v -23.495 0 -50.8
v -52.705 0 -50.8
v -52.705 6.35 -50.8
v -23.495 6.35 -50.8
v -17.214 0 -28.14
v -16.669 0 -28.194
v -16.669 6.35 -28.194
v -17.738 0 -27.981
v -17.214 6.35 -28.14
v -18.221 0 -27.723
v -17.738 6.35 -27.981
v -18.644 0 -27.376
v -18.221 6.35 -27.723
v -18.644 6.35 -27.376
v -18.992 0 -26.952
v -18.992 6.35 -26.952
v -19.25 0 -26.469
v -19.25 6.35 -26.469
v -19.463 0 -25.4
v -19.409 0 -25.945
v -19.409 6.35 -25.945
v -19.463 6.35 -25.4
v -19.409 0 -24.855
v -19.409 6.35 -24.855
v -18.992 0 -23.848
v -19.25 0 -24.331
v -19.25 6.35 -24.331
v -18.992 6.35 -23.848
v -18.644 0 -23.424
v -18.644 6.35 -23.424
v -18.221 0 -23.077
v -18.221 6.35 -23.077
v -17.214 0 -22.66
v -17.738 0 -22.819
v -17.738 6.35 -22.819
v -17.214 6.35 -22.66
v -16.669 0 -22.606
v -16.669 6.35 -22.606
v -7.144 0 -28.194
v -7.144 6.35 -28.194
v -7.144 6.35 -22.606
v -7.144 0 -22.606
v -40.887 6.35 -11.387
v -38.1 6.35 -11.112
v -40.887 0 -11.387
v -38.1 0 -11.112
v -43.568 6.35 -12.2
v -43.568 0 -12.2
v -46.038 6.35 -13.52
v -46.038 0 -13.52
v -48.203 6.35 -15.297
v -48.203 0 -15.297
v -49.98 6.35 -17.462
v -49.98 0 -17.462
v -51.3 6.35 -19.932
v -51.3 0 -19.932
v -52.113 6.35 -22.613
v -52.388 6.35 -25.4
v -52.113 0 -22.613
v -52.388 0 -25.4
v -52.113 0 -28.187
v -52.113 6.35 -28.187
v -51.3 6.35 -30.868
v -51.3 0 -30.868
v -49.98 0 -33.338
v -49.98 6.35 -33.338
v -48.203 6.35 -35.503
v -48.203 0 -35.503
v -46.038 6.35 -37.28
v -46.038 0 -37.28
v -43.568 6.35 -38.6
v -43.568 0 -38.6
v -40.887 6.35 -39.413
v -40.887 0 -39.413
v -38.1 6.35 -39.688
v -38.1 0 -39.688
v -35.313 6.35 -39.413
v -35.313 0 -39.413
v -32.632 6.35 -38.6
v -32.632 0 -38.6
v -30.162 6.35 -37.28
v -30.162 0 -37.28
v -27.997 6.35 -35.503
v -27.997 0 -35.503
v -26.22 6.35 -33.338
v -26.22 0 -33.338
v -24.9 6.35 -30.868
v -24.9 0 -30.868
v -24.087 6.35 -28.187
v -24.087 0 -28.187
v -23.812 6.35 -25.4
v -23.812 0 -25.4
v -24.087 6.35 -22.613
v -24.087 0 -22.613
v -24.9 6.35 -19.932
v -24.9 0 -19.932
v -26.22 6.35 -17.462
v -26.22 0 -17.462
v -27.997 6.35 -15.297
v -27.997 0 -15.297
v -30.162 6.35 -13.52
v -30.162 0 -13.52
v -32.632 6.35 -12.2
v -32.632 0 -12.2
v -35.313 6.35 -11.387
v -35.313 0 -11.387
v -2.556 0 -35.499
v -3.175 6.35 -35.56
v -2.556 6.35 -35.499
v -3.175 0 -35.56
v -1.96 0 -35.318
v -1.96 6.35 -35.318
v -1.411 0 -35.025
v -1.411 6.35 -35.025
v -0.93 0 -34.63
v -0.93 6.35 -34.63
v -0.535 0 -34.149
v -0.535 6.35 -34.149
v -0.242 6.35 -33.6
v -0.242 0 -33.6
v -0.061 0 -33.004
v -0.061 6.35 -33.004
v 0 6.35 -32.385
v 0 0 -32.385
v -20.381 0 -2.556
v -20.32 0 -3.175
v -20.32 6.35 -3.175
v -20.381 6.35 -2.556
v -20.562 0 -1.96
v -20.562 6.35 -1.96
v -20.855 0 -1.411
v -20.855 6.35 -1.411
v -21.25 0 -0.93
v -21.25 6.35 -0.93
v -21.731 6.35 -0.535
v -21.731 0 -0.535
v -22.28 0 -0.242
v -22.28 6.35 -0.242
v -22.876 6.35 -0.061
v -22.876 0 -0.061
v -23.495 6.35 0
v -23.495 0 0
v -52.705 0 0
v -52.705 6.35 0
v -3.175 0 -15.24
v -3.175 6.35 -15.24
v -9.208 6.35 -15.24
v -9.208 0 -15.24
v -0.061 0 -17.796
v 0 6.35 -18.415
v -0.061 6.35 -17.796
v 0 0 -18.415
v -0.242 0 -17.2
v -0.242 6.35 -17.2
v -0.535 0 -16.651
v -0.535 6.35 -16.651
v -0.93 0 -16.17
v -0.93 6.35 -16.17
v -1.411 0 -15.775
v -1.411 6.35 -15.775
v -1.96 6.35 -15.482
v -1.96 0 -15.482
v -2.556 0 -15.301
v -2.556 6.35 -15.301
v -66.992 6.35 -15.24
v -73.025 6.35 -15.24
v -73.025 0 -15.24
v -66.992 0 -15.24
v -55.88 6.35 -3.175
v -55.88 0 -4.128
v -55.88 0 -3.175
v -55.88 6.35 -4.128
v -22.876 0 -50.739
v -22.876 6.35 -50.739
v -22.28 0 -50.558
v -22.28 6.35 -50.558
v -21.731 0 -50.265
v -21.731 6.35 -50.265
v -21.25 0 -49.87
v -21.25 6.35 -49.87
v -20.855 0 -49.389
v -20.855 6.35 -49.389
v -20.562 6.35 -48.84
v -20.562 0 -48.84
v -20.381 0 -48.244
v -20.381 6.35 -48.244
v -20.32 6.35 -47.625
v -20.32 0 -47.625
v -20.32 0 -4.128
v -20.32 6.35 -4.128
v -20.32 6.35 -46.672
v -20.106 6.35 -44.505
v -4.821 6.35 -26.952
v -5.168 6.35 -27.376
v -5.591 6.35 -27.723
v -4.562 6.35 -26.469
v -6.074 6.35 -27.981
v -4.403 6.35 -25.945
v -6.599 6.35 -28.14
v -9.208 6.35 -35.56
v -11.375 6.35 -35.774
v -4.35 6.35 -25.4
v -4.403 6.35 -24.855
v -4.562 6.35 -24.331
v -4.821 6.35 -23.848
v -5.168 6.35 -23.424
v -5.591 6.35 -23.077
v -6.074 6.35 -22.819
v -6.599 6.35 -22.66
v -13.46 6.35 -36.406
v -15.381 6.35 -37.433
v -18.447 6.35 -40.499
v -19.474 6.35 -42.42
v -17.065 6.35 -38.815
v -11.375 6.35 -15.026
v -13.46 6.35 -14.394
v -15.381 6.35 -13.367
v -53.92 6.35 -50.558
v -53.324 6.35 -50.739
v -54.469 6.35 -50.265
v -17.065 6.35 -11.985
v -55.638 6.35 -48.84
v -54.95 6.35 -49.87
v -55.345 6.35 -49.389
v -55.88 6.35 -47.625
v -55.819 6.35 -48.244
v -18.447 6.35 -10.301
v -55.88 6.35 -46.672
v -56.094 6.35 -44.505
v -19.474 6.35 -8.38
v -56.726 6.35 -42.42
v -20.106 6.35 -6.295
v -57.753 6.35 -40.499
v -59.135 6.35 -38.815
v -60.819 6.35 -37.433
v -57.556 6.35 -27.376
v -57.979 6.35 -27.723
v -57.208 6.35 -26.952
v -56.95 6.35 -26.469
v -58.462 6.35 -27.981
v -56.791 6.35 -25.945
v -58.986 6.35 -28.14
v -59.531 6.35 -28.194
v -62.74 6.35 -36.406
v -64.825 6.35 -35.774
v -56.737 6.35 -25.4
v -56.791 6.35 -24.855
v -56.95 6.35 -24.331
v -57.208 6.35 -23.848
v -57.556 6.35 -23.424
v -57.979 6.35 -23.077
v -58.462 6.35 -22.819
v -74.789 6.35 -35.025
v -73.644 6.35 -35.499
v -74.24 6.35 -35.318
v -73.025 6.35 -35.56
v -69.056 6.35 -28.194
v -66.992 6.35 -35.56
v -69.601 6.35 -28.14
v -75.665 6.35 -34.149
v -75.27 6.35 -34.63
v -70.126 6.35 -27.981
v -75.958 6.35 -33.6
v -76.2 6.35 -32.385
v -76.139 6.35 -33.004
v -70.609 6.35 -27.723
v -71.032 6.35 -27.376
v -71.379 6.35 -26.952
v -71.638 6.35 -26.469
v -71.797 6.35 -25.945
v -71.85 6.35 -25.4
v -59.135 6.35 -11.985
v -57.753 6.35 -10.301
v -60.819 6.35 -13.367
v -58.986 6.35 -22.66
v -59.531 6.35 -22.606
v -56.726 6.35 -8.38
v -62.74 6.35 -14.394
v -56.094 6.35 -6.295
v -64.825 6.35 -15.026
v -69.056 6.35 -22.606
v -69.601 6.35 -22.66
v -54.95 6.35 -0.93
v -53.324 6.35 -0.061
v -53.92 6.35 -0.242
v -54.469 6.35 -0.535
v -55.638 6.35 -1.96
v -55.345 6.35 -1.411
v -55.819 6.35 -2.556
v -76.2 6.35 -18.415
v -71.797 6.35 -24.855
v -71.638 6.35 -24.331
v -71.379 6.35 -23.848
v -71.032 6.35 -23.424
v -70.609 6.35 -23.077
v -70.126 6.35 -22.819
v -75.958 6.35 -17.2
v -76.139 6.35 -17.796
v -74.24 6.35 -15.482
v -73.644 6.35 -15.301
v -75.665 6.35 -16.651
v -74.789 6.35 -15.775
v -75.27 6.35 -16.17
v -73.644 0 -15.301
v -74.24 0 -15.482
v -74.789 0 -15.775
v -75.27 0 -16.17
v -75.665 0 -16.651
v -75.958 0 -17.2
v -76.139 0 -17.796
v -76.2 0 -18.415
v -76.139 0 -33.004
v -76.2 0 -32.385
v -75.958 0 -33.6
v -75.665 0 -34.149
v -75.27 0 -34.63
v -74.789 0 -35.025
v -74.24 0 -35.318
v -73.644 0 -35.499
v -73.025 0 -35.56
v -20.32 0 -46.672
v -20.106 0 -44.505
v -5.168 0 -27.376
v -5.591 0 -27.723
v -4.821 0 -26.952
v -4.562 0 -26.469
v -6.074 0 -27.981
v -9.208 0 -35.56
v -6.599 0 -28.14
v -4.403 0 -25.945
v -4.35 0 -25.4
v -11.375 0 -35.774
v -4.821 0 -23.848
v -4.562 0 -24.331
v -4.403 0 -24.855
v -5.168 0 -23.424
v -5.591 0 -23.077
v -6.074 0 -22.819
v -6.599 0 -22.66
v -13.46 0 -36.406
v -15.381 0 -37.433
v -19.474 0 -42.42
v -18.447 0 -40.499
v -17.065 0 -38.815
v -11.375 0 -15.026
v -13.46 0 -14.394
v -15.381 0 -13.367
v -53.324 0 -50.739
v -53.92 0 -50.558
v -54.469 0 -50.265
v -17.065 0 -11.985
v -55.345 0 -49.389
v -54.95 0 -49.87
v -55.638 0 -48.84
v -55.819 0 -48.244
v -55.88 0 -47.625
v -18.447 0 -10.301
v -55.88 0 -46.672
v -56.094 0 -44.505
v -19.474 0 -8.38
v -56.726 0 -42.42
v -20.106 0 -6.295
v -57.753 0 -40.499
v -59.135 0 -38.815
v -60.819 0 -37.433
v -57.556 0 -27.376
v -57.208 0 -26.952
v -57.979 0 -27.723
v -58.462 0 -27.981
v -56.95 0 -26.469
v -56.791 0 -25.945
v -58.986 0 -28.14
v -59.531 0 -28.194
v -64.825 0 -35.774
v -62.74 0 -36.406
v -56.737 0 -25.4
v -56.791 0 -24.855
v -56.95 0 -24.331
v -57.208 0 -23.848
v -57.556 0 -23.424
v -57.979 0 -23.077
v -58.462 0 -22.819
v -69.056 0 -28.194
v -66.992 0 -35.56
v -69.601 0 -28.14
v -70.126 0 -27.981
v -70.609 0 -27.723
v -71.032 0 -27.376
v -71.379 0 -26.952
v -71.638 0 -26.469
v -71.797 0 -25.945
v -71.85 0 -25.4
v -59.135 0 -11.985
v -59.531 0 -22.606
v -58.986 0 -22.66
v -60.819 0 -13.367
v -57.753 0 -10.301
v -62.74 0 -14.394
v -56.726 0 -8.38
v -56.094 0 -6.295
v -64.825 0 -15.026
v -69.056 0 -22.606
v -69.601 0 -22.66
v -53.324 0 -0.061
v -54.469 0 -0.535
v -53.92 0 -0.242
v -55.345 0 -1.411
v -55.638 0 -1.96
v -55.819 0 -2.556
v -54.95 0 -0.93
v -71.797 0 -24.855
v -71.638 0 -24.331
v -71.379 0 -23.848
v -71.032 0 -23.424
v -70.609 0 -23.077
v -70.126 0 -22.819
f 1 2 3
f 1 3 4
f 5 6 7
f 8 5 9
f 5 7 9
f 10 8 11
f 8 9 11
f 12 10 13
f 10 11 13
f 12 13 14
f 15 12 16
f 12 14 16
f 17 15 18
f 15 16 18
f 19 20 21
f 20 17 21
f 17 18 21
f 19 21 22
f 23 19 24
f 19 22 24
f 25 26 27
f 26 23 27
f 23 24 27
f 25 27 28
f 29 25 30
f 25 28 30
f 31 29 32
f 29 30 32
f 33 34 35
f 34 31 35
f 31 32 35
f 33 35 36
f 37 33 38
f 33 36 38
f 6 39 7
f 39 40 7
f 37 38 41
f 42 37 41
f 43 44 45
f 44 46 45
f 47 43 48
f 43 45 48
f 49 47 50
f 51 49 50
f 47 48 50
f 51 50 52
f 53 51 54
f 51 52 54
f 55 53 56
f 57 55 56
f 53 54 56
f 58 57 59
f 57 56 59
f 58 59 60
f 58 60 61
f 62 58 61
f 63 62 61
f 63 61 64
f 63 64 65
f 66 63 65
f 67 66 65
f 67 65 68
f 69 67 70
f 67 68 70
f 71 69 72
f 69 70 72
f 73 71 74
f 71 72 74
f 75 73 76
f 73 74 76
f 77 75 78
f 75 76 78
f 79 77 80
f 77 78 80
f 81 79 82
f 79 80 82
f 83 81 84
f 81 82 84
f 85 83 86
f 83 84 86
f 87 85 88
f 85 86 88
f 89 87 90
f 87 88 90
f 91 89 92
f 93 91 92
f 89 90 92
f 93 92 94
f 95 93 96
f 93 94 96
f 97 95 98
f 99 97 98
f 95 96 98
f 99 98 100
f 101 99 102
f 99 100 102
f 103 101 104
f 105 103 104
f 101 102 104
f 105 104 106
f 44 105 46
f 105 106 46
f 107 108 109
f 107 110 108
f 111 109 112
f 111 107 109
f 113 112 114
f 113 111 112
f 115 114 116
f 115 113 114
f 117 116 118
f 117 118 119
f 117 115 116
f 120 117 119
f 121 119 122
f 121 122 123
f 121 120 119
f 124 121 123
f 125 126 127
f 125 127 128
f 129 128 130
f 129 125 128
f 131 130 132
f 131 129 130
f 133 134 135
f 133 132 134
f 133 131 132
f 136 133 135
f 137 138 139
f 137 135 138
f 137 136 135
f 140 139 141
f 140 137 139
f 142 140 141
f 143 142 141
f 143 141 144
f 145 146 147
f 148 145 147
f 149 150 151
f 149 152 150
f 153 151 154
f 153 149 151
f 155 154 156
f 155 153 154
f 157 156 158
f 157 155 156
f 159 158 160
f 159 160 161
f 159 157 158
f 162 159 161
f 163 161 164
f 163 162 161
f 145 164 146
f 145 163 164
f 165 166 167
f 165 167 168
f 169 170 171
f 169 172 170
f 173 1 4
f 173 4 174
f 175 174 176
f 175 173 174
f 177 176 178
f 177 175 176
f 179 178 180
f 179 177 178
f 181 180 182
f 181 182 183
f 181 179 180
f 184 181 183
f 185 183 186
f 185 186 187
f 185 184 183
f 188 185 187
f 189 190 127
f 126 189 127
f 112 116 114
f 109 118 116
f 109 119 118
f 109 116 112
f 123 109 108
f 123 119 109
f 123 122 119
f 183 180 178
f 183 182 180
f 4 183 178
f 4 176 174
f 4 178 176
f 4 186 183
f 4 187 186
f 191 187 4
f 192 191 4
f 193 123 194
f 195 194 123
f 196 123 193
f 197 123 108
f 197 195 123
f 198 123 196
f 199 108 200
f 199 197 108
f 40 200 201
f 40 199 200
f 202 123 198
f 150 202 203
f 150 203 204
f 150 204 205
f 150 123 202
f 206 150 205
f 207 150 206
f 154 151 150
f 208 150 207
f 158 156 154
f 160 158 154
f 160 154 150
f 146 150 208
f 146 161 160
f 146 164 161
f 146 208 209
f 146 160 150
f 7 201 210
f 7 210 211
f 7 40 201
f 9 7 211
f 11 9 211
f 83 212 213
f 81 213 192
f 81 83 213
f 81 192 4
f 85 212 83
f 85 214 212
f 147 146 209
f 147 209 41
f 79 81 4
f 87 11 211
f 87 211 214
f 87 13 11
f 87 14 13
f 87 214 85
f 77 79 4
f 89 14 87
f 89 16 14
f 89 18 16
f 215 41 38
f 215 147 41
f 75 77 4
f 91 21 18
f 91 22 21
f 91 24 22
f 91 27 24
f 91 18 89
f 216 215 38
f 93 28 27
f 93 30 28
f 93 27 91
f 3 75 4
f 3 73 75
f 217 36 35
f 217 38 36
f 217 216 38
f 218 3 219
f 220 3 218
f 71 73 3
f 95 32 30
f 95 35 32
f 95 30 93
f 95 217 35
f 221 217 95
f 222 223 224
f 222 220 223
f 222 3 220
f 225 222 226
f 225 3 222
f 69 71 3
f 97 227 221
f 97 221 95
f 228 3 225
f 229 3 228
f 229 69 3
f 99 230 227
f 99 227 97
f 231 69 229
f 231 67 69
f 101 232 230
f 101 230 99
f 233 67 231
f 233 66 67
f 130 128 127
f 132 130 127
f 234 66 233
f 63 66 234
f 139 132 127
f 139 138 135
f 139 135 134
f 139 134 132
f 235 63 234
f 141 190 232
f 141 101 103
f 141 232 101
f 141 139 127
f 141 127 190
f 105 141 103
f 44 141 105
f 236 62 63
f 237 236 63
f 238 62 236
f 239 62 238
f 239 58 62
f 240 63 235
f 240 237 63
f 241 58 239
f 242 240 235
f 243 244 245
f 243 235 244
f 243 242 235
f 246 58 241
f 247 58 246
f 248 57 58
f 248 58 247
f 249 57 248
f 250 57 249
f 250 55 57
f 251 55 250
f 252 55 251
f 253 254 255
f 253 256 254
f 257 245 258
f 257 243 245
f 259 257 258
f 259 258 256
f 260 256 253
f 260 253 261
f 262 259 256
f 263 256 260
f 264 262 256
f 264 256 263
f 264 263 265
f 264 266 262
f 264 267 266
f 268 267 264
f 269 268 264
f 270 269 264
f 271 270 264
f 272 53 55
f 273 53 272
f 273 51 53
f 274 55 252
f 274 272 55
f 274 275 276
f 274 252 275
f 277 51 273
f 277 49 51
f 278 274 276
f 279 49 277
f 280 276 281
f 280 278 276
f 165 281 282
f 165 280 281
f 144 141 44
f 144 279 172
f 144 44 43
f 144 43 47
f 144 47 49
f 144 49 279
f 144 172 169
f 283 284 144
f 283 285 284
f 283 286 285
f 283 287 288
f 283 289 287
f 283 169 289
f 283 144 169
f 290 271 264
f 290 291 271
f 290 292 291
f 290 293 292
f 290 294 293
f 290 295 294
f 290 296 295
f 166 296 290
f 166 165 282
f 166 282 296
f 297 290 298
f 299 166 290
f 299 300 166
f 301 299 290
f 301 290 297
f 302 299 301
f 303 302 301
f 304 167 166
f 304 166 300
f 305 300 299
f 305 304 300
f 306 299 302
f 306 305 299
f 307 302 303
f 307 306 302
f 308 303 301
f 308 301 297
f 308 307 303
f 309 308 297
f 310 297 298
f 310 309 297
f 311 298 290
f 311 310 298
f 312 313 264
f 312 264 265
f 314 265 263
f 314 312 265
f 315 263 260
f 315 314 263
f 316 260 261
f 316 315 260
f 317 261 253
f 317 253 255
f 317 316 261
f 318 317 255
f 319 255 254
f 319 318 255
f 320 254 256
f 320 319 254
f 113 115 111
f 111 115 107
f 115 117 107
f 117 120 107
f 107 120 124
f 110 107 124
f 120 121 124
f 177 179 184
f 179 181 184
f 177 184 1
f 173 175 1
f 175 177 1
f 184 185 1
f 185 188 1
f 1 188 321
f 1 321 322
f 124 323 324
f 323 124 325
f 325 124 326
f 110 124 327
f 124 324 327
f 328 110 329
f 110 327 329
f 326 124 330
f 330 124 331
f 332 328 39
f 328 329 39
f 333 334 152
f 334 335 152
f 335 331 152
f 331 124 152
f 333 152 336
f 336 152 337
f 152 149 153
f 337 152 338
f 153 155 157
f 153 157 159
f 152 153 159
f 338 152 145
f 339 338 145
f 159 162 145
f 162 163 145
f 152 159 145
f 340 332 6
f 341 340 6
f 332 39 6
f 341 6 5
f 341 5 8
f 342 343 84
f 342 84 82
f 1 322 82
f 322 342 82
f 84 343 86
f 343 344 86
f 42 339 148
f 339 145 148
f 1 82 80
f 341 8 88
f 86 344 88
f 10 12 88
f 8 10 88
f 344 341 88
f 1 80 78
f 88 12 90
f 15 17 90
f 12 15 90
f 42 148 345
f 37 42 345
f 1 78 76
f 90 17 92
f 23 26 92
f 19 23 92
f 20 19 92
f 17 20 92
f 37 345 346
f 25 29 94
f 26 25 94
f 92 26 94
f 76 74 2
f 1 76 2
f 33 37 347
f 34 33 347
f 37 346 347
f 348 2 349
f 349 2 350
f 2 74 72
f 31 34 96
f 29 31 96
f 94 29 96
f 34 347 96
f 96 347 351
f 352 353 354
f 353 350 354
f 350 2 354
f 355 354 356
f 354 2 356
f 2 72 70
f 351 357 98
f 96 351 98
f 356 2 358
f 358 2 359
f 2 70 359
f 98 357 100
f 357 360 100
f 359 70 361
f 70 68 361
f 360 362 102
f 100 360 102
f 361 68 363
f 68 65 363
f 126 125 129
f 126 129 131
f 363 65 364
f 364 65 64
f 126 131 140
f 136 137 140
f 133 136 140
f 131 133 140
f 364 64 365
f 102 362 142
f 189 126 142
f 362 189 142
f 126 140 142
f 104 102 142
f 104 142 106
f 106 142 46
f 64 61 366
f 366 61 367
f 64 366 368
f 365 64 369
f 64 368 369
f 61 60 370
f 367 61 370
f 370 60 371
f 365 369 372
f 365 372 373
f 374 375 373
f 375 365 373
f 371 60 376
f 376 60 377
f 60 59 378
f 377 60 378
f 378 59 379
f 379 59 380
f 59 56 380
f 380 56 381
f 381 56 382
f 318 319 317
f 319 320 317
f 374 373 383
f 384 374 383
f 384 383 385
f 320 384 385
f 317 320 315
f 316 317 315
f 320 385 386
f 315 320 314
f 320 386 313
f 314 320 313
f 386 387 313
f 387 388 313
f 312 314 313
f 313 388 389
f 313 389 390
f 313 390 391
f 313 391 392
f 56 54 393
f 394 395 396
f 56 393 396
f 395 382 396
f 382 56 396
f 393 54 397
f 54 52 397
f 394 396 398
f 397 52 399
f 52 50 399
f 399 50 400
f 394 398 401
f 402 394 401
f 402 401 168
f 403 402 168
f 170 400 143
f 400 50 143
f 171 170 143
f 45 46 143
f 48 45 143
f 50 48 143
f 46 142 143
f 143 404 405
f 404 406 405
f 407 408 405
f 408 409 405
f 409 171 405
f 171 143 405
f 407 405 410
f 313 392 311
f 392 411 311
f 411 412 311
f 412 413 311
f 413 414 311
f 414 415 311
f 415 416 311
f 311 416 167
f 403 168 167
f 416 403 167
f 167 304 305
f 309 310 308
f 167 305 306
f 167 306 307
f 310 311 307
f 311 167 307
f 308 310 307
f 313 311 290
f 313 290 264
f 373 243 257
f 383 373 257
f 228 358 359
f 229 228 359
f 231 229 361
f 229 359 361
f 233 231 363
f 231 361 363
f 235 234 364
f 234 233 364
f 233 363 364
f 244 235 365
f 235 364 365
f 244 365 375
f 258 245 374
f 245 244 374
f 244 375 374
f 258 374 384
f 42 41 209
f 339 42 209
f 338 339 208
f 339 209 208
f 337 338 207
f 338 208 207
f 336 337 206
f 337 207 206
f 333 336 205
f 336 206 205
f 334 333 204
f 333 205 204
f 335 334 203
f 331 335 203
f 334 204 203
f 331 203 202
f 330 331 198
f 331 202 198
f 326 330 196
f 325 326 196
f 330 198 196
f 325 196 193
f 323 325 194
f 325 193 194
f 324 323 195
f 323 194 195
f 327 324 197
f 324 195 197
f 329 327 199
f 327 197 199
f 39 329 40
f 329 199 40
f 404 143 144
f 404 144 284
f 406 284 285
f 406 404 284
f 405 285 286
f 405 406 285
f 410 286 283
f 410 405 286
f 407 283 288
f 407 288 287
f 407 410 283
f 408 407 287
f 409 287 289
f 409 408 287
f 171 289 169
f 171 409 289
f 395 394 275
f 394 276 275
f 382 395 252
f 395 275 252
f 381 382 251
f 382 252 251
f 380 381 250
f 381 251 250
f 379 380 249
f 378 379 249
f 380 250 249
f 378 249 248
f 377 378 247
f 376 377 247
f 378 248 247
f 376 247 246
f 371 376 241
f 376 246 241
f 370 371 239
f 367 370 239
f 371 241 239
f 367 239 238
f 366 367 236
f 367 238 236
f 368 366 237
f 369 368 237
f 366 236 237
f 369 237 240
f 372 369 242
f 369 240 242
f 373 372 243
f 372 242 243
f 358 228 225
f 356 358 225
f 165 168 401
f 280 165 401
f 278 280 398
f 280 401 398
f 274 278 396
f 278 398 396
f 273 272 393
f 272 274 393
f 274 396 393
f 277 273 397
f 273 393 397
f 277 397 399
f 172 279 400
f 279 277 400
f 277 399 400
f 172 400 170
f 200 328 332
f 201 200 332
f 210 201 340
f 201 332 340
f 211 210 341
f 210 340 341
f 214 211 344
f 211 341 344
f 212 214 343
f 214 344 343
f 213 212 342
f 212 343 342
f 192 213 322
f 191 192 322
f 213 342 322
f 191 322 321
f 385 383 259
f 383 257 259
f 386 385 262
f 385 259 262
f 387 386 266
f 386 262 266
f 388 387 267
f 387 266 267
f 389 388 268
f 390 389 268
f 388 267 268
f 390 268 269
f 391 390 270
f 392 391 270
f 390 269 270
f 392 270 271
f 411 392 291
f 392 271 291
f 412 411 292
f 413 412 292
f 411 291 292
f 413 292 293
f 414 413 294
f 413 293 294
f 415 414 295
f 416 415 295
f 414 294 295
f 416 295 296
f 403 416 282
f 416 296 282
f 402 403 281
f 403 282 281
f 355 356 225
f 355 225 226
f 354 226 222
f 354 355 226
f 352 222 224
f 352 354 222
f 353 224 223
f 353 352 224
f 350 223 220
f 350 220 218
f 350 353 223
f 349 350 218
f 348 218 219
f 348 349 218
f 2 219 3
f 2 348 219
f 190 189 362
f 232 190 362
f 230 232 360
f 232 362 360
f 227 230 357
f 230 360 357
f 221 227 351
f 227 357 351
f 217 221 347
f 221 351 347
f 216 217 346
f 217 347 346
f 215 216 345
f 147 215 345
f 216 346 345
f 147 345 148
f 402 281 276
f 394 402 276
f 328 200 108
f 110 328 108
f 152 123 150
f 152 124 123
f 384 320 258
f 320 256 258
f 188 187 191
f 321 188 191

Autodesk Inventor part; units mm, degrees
ref_plane "YZ Plane" through (0, 0, 0) normal (1, 0, 0) x (0, 1, 0)
ref_plane "XZ Plane" through (0, 0, 0) normal (0, 1, 0) x (-1, 0, 0)
ref_plane "XY Plane" through (0, 0, 0) normal (0, 0, 1) x (1, 0, 0)
sketch "Sketch1" plane through (0, 0, 0) normal (0, 1, 0) x (-1, 0, 0)
  line L0 (0, 0) -> (76.2, 0)
  line L1 (76.2, 0) -> (76.2, -50.8)
  line L2 (76.2, -50.8) -> (0, -50.8)
  line L3 (0, -50.8) -> (0, 0)
  dimension "d0" = 76.2
  dimension "d1" = 50.8
extrude "Extrusion1" add sketch "Sketch1" along normal blind 6.35
sketch "Sketch2" plane through (0, 6.35, 0) normal (0, 1, 0) x (1, 0, 0)
  line L0 (0, 0) -> (0, 50.8) projected
  line L1 (-76.2, 50.8) -> (-76.2, 0) projected
  line L2 (0, 50.8) -> (-76.2, 0)
  line L3 (-76.2, 0) -> (-76.2, 50.8)
  line L4 (-76.2, 50.8) -> (0, 0)
  circle A0 centre (-38.1, 25.4) radius 14.2875
  dimension "d4" = 28.575
hole "Hole1" at (-38.1, 6.35, -25.4) direction (0, -1, 0) diameter 28.575 end through all
sketch "Sketch3" plane through (0, 6.35, 0) normal (0, 1, 0) x (1, 0, 0)
  line L0 (0, 50.8) -> (0, 0) projected
  line L1 (0, 25.4) -> (-23.8125, 25.4)
  circle A0 centre (-38.1, 25.4) radius 14.2875 projected
  line L2 (-52.3875, 25.4) -> (-76.2, 25.4) construction
  line L3 (-76.2, 0) -> (-76.2, 50.8) projected
  line L4 (-69.0563, 25.4) -> (-59.5312, 25.4) construction
  line L5 (-69.0563, 22.606) -> (-59.5312, 22.606)
  line L6 (-59.5312, 28.194) -> (-69.0563, 28.194)
  arc A1 (-69.0563, 28.194) -> (-69.0563, 22.606) centre (-69.0563, 25.4) ccw
  arc A2 (-59.5312, 22.606) -> (-59.5312, 28.194) centre (-59.5312, 25.4) ccw
  line L7 (-16.6688, 25.4) -> (-7.1437, 25.4) construction
  line L8 (-16.6688, 22.606) -> (-7.1437, 22.606)
  line L9 (-7.1437, 28.194) -> (-16.6688, 28.194)
  arc A3 (-16.6688, 28.194) -> (-16.6688, 22.606) centre (-16.6688, 25.4) ccw
  arc A4 (-7.1437, 22.606) -> (-7.1437, 28.194) centre (-7.1437, 25.4) ccw
  point P0 (-64.2938, 25.4)
  point P1 (-11.9062, 25.4)
  dimension "d12" = 4.7625
  dimension "d13" = 5.588
  dimension "d14" = 4.7625
  dimension "d15" = 5.588
extrude "Extrusion2" cut sketch "Sketch3" against normal blind 6.35 contours A4 L8 A3 L1 | L1 A3 L9 A4 | A1 L6 A2 L5
sketch "Sketch4" plane through (0, 6.35, 0) normal (0, 1, 0) x (1, 0, 0)
  point P0 (0, 0)
sketch "Sketch5" plane through (0, 6.35, 0) normal (0, 1, 0) x (1, 0, 0)
  line L0 (0, 0) -> (0, 50.8) projected
  line L1 (0, 0) -> (0, 15.24)
  line L2 (0, 15.24) -> (-20.32, 15.24)
  line L3 (-20.32, 15.24) -> (-20.32, 0)
  line L4 (0, 50.8) -> (-20.32, 50.8)
  line L5 (-20.32, 50.8) -> (-20.32, 35.56)
  line L6 (-20.32, 35.56) -> (0, 35.56)
  line L7 (0, 35.56) -> (0, 50.8)
  line L8 (0, 50.8) -> (-76.2, 50.8) projected
  line L9 (-76.2, 50.8) -> (-76.2, 35.56)
  line L10 (-76.2, 50.8) -> (-76.2, 0) projected
  line L11 (-76.2, 0) -> (0, 0) projected
  line L12 (-76.2, 0) -> (-76.2, 15.24)
  line L13 (-76.2, 15.24) -> (-55.88, 15.24)
  line L14 (-55.88, 15.24) -> (-55.88, 0)
  line L15 (-76.2, 35.56) -> (-55.88, 35.56)
  line L16 (-55.88, 35.56) -> (-55.88, 50.8)
  line L17 (-76.2, 0) -> (-55.88, 0)
  line L18 (-76.2, 15.24) -> (-55.88, 15.24)
  line L19 (-20.32, 0) -> (0, 0)
  line L20 (-55.88, 50.8) -> (-76.2, 50.8)
  dimension "d19" = 15.24
  dimension "d20" = 20.32
  dimension "d21" = 20.32
  dimension "d22" = 15.24
  dimension "d23" = 20.32
extrude "Extrusion3" cut sketch "Sketch5" against normal blind 25.4 contours L11 L3 L2 L0 | L6 L5 L4 L0 | L11 L10 L13 L14 | L16 L15 L9 L8
fillet "Fillet2" radius 3.175 8 edges at (-55.88, 3.175, -50.8) (-76.2, 3.175, -35.56) (-76.2, 3.175, -15.24) (-55.88, 3.175, 0) (0, 3.175, -15.24) (0, 3.175, -35.56) (-20.32, 3.175, -50.8) (-20.32, 3.175, 0)
fillet "Fillet3" radius 11.1125 4 edges at (-20.32, 3.175, -35.56) (-55.88, 3.175, -35.56) (-55.88, 3.175, -15.24) (-20.32, 3.175, -15.24)
properties part number "4461-17-0101 Tensioner Plate" material "Aluminum 6061"
